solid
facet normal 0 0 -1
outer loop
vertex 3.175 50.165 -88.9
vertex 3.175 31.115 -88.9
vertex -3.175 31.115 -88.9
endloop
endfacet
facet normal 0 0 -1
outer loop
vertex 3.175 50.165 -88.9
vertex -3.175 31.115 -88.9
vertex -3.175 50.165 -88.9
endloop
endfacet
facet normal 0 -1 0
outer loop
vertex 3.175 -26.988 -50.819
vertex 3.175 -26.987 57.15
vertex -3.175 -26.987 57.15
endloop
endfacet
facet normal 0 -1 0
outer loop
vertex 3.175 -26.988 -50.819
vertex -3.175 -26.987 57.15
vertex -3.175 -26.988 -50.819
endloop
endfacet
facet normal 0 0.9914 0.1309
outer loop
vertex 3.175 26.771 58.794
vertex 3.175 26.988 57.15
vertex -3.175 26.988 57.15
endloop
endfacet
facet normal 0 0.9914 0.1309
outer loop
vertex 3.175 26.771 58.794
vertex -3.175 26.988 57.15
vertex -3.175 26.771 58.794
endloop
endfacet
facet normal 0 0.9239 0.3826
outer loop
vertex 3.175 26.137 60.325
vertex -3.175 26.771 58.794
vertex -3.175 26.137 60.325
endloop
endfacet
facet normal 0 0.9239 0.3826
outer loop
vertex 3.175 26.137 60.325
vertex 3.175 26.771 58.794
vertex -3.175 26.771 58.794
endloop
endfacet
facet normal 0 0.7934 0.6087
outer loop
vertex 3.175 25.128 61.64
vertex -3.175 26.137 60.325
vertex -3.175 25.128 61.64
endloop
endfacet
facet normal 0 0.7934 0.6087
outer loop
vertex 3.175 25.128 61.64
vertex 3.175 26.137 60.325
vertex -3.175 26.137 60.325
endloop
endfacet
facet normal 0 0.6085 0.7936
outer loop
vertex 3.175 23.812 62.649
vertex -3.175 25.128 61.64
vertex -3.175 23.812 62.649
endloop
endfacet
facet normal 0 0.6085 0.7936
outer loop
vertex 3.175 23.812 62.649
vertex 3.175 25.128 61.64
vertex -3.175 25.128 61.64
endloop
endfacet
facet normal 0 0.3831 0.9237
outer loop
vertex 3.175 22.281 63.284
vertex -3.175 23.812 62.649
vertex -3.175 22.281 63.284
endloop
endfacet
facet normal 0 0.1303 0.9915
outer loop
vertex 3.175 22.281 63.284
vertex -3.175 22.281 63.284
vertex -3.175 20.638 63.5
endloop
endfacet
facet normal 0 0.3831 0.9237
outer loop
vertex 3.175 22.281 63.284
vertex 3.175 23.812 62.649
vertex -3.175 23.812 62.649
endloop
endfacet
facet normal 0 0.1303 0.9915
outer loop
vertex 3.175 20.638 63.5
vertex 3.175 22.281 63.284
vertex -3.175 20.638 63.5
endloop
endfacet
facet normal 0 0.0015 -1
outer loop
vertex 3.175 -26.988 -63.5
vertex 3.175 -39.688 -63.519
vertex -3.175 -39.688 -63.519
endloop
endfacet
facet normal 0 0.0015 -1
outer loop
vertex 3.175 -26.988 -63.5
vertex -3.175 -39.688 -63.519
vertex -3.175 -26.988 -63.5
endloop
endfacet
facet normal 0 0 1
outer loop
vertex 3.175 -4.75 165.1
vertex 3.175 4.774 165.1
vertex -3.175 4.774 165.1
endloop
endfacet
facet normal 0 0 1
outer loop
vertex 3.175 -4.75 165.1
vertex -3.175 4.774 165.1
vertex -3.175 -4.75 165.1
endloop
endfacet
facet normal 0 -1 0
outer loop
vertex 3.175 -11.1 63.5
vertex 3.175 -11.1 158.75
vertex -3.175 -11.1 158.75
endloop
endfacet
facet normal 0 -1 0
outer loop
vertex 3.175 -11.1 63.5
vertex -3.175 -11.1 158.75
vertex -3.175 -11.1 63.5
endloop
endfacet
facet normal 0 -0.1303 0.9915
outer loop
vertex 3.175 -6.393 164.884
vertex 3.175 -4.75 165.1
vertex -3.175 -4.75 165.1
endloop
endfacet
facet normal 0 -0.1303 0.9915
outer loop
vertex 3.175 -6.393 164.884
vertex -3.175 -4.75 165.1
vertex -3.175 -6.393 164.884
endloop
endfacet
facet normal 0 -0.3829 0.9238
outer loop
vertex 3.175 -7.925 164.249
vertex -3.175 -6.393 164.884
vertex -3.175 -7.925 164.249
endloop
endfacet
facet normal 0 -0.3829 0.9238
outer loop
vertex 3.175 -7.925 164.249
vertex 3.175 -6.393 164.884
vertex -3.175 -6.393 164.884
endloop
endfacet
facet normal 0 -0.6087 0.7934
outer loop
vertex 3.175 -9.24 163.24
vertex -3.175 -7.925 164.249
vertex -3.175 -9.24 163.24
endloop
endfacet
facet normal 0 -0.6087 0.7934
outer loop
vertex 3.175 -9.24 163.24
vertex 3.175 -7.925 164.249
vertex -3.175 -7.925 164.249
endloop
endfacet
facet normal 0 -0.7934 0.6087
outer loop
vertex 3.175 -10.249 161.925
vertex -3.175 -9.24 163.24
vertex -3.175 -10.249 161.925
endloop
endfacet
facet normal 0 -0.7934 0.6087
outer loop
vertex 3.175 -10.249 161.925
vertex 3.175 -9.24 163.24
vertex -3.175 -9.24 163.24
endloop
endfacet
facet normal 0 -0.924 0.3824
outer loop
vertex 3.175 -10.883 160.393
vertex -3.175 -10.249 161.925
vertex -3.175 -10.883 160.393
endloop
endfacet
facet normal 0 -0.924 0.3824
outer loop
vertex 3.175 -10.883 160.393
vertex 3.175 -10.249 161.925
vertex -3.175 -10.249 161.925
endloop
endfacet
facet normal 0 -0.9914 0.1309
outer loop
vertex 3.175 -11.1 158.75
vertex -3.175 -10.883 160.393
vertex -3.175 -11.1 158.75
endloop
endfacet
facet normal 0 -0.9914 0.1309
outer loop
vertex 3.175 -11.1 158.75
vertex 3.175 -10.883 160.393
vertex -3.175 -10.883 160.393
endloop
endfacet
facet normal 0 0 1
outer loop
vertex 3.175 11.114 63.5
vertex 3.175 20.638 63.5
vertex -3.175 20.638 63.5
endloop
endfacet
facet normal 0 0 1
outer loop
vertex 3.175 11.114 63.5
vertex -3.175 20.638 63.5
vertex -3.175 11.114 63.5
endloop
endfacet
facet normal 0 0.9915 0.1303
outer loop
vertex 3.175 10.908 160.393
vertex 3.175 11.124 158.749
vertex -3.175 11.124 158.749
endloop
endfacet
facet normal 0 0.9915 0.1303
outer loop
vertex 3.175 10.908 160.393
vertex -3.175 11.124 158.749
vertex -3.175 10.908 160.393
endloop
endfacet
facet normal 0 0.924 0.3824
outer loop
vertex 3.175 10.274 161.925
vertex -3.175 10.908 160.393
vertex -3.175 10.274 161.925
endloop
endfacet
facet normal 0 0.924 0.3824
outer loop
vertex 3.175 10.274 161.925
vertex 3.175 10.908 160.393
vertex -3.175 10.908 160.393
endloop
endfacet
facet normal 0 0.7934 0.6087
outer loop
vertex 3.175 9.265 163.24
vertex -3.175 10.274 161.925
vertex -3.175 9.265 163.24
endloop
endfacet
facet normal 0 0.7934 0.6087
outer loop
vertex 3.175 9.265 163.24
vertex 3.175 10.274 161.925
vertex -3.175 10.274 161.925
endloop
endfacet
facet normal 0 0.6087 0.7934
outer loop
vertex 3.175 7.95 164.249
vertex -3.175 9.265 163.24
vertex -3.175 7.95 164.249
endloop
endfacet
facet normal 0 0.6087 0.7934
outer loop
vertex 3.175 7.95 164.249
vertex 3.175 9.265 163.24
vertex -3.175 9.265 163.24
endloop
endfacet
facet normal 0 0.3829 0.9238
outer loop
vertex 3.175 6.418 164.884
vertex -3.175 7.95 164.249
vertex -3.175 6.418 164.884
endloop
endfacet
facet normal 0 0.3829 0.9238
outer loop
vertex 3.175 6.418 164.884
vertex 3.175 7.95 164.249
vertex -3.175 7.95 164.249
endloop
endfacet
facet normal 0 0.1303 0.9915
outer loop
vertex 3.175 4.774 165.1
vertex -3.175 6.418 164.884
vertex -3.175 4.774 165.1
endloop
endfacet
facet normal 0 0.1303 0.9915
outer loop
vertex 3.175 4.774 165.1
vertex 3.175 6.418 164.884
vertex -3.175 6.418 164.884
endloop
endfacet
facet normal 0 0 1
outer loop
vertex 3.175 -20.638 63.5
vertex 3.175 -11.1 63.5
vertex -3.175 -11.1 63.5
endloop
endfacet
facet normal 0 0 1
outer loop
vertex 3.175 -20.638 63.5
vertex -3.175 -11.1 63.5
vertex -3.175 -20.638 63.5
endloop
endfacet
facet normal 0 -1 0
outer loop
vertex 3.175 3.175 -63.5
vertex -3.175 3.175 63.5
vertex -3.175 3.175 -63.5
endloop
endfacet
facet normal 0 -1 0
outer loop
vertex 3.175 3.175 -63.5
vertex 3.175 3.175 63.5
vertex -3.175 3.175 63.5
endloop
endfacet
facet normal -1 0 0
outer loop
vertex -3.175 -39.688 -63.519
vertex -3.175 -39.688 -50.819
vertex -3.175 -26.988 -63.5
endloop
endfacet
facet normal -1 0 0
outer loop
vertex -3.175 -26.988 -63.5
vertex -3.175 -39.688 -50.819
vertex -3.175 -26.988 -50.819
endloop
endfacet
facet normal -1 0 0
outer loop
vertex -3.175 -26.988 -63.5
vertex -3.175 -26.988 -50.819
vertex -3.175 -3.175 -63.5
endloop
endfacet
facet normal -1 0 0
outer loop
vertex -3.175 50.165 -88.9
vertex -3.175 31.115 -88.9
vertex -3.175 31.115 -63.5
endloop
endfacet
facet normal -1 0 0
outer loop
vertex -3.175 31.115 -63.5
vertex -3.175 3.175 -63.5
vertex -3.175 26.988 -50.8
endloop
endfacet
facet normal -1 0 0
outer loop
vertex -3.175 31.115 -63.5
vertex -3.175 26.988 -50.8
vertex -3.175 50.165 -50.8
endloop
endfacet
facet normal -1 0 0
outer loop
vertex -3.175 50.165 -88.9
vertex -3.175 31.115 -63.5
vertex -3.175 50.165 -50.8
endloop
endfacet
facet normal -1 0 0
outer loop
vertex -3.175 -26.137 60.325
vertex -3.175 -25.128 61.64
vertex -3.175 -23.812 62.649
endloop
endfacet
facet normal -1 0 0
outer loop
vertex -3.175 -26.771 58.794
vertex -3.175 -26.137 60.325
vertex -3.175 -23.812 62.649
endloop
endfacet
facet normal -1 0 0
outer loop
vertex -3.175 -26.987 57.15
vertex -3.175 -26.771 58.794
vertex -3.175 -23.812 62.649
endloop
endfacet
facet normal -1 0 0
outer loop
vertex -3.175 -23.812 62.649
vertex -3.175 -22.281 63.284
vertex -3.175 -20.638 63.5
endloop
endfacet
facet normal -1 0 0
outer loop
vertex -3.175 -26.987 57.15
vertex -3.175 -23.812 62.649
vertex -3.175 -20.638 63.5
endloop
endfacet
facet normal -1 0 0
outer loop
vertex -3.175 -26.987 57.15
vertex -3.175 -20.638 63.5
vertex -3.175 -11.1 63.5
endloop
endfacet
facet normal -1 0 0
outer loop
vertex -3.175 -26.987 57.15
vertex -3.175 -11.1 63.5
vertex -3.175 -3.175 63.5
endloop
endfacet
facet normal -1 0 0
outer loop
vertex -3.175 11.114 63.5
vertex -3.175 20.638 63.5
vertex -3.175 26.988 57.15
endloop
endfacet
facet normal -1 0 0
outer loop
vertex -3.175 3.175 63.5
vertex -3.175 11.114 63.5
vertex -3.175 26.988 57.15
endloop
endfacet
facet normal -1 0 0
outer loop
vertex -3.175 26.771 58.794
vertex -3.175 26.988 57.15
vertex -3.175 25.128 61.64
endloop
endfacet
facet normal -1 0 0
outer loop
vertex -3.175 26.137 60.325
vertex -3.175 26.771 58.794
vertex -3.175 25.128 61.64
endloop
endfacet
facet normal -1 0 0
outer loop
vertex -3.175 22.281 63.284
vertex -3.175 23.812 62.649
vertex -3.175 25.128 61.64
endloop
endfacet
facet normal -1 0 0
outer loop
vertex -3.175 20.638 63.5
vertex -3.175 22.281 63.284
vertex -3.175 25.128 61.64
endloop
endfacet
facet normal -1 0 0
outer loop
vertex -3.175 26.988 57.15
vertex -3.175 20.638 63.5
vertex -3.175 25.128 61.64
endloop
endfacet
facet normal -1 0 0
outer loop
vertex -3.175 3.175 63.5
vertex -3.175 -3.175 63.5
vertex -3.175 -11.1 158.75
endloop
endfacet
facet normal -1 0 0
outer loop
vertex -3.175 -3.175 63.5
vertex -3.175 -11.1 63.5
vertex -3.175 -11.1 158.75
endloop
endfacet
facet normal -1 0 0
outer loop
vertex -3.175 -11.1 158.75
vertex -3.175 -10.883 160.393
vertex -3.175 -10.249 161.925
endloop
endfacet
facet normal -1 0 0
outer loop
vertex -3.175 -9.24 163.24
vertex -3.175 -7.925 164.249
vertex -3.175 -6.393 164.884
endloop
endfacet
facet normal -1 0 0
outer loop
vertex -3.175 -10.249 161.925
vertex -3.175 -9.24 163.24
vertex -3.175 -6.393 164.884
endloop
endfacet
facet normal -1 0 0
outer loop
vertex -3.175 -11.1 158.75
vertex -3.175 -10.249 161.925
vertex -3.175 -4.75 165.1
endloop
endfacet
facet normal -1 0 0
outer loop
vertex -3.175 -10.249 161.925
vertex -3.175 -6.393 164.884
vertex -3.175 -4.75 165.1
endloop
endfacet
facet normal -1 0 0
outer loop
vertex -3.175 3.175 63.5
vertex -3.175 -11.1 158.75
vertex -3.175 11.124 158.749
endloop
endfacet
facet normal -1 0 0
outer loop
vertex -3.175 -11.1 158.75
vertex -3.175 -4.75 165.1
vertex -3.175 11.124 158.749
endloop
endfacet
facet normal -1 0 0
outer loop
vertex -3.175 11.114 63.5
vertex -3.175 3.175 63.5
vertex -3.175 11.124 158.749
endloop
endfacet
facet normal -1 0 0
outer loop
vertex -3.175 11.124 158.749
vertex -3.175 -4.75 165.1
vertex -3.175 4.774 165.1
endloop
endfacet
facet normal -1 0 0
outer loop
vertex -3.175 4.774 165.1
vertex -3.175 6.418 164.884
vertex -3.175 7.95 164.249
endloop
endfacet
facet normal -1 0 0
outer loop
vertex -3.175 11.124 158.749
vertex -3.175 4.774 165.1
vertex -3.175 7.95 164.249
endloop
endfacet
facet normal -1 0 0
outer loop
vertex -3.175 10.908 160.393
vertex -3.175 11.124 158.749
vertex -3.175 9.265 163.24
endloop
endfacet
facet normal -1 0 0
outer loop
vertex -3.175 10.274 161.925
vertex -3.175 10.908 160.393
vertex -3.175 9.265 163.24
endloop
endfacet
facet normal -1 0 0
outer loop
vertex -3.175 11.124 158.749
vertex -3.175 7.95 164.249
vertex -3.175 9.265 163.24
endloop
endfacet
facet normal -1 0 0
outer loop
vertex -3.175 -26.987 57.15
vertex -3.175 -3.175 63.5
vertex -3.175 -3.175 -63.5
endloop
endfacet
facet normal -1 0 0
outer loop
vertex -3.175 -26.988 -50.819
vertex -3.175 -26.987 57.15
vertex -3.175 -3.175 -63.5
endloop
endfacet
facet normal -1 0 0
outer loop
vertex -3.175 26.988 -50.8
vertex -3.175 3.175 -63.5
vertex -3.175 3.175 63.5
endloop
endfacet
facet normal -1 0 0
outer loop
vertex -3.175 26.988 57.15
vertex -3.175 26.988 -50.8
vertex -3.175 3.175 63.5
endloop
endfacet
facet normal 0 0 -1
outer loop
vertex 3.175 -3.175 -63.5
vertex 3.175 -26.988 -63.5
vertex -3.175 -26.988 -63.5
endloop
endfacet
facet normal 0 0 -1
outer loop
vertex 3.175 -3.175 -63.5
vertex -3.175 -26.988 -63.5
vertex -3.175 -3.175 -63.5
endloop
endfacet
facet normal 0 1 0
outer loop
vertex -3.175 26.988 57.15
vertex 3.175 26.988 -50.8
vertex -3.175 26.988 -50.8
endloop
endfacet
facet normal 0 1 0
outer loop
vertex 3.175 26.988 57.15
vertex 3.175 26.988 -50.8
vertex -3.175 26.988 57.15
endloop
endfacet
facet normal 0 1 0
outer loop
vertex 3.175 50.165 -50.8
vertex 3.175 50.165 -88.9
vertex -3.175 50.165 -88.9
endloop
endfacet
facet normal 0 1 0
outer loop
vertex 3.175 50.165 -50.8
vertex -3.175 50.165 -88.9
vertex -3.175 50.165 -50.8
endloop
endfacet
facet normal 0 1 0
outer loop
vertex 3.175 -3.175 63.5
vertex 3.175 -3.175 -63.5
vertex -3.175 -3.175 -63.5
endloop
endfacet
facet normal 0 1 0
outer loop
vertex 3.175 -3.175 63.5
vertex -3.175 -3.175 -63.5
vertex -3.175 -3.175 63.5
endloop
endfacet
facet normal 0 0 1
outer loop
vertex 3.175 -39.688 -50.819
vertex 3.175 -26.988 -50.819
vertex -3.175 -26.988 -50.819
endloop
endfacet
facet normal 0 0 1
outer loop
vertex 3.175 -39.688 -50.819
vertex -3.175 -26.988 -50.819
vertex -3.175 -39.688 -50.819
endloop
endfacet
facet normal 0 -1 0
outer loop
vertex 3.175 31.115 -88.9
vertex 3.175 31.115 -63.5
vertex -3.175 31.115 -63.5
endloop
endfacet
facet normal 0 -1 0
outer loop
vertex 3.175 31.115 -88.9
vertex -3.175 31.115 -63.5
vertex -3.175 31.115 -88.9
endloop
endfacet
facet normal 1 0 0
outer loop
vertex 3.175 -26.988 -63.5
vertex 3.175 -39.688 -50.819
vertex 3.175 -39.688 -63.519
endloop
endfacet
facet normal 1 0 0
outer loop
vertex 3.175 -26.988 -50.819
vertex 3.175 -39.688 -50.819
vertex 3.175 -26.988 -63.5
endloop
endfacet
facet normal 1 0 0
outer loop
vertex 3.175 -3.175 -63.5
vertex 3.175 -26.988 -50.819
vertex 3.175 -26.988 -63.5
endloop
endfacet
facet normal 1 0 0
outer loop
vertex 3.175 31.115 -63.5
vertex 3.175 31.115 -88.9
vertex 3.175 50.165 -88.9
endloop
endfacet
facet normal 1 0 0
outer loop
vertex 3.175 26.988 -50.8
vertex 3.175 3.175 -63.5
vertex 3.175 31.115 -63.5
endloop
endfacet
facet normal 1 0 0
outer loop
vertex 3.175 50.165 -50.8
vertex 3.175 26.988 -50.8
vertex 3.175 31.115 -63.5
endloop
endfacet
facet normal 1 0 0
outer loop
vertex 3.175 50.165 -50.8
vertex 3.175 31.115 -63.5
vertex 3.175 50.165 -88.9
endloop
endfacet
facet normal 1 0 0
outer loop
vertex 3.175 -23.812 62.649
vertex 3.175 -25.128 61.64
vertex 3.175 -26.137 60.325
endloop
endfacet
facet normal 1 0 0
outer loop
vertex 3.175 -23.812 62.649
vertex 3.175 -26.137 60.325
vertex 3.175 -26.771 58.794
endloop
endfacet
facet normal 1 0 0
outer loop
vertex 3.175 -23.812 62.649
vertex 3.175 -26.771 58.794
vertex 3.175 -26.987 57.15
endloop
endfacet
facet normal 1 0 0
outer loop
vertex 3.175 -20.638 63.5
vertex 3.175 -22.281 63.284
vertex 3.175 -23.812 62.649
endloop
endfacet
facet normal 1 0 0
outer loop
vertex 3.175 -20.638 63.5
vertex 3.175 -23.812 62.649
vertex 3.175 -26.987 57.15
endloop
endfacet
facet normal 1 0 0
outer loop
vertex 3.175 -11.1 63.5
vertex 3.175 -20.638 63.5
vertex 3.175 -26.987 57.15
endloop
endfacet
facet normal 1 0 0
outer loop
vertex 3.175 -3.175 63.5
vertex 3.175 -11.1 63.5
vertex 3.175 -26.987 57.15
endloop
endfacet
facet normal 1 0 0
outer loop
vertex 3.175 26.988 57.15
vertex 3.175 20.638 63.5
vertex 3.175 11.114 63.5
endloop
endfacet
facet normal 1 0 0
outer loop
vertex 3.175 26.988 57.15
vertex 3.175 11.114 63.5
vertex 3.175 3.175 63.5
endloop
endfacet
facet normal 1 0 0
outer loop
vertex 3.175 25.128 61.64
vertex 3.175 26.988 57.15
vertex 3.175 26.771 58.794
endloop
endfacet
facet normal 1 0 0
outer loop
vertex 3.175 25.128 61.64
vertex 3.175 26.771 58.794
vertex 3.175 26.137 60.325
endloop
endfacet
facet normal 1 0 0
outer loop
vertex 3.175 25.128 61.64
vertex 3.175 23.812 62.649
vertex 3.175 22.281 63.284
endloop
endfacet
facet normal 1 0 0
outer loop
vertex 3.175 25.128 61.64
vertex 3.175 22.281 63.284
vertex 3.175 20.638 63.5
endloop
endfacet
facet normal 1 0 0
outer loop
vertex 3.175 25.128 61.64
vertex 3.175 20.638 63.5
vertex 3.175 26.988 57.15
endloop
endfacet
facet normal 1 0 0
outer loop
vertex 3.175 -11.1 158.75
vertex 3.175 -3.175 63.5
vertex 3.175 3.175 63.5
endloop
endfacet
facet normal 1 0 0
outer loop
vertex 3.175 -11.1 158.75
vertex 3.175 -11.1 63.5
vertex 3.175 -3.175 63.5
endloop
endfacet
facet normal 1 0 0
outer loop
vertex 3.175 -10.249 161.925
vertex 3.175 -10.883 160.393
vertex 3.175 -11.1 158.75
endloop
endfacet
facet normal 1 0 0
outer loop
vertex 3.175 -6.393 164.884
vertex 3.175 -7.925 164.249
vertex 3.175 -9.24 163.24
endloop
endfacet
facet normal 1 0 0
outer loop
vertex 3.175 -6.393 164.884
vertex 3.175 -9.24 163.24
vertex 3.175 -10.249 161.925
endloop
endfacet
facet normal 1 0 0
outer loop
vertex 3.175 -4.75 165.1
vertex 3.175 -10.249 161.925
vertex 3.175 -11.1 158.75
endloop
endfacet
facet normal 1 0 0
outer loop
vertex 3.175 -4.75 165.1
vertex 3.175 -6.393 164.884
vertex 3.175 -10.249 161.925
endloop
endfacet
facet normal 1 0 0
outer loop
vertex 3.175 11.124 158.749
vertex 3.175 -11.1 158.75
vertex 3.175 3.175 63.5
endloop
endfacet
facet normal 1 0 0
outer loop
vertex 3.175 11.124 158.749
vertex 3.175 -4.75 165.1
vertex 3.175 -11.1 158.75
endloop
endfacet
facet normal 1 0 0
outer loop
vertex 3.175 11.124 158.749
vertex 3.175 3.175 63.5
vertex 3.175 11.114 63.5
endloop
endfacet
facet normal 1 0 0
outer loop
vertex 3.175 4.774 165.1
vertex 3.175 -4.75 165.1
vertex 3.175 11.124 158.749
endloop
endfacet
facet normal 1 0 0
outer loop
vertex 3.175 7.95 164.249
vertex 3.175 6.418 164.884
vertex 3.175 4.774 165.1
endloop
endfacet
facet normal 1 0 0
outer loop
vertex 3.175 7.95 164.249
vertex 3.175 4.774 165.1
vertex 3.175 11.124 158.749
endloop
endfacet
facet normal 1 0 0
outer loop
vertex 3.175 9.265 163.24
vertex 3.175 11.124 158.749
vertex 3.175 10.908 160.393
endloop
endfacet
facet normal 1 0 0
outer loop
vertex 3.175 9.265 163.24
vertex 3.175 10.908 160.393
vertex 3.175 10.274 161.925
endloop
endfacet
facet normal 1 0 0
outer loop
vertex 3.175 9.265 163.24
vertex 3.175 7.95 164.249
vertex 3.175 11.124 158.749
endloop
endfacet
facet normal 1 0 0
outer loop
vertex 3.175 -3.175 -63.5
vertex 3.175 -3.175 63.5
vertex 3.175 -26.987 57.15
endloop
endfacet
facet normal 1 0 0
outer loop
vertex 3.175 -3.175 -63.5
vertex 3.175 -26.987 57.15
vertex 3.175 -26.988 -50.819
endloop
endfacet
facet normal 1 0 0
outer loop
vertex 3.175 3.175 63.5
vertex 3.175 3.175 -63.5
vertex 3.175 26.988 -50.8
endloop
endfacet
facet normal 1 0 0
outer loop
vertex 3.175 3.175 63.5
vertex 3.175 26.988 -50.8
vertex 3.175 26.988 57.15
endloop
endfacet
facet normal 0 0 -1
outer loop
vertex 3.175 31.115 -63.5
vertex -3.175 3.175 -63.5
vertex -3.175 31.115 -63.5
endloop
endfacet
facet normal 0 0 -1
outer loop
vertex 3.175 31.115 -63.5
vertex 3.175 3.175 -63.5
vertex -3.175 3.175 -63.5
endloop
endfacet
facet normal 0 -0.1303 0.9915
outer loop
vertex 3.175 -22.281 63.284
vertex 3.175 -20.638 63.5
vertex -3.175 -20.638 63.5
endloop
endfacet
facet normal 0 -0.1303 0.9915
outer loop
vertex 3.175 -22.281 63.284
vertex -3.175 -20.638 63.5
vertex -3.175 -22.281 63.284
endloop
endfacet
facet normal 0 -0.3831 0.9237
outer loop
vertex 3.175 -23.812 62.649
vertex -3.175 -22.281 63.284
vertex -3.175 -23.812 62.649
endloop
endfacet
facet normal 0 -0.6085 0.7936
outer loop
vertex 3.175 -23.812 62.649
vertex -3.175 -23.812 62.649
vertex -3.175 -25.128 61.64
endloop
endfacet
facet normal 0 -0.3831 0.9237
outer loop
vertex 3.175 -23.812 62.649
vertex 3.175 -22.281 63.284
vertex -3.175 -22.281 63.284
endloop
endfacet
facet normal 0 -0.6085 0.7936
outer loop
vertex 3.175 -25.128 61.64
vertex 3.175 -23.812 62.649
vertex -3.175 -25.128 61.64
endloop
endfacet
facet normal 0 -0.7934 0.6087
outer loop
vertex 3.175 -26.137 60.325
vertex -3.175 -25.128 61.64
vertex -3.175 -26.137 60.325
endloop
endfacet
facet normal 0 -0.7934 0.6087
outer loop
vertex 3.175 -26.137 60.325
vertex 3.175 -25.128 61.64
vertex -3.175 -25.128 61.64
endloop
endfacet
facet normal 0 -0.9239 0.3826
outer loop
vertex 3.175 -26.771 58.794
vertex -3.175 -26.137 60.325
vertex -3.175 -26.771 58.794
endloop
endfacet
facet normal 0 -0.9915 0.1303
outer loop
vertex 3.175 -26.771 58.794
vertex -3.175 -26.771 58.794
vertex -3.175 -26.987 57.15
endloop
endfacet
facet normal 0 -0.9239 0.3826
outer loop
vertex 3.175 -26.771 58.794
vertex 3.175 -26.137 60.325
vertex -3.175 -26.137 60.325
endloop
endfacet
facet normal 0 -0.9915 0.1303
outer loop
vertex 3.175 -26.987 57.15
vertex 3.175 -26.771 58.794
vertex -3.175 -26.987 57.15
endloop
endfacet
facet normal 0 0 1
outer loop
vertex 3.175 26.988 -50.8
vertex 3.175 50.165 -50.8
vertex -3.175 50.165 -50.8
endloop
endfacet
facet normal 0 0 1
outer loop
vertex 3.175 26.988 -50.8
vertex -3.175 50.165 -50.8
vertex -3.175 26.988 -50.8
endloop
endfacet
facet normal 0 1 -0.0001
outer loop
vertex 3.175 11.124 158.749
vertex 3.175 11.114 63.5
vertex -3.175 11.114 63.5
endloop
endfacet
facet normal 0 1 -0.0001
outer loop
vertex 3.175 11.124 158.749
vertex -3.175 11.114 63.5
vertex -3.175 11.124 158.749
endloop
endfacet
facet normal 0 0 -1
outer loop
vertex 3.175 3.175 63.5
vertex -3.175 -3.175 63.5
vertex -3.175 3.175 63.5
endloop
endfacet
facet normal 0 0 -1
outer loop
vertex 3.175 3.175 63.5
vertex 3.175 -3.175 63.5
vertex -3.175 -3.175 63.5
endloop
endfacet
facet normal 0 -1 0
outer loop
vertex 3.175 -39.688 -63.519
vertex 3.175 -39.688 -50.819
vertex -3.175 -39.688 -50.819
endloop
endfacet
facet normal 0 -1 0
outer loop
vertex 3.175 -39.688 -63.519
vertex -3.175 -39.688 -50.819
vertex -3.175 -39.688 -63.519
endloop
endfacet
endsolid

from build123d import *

# Parameters (mm, degrees)
F1_DEPTH = 3.175


with BuildPart() as f1:
    # F0 (on Right) → F1 (new body, symmetric)
    with BuildSketch(Plane.YZ):
        with BuildLine():
            Line((3.175, -63.5), (26.9875, -63.5))
            Line((26.9875, -63.5), (26.9875, -50.8))
            Line((26.9875, -50.8), (26.9875, 57.15))
            ThreePointArc((26.9875, 57.15), (25.127628, 61.640128), (20.6375, 63.5))
            Line((20.6375, 63.5), (17.464617, 63.5))
            Line((17.464617, 63.5), (11.113911, 63.5))
            Line((11.113911, 63.5), (11.124494, 158.749293))
            ThreePointArc((11.124494, 158.749293), (9.264872, 163.239877), (4.774494, 165.099999))
            Line((4.774494, 165.099999), (-4.7498, 165.099999))
            ThreePointArc((-4.7498, 165.099999), (-9.239928, 163.240127), (-11.0998, 158.749999))
            Line((-11.0998, 158.749999), (-11.0998, 63.5))
            Line((-11.0998, 63.5), (-17.4498, 63.5))
            Line((-17.4498, 63.5), (-20.6375, 63.5))
            ThreePointArc((-20.6375, 63.5), (-25.127628, 61.640128), (-26.9875, 57.15))
            Line((-26.9875, 57.15), (-26.9875, -50.818807))
            Line((-26.9875, -50.818807), (-26.9875, -63.5))
            Line((-26.9875, -63.5), (-3.175, -63.5))
            Line((-3.175, -63.5), (-3.175, 63.5))
            Line((-3.175, 63.5), (3.175, 63.5))
            Line((3.175, 63.5), (3.175, -63.5))
        make_face()
        Polygon((26.9875, -50.8), (26.9875, -63.5), (31.115, -63.5), (31.115, -88.9), (50.165, -88.9), (50.165, -50.8), align=None)
        Polygon((-39.6875, -63.518807), (-26.9875, -63.5), (-26.9875, -50.818807), (-39.6875, -50.818807), align=None)
    extrude(amount=F1_DEPTH, both=True)


solid = f1.part
